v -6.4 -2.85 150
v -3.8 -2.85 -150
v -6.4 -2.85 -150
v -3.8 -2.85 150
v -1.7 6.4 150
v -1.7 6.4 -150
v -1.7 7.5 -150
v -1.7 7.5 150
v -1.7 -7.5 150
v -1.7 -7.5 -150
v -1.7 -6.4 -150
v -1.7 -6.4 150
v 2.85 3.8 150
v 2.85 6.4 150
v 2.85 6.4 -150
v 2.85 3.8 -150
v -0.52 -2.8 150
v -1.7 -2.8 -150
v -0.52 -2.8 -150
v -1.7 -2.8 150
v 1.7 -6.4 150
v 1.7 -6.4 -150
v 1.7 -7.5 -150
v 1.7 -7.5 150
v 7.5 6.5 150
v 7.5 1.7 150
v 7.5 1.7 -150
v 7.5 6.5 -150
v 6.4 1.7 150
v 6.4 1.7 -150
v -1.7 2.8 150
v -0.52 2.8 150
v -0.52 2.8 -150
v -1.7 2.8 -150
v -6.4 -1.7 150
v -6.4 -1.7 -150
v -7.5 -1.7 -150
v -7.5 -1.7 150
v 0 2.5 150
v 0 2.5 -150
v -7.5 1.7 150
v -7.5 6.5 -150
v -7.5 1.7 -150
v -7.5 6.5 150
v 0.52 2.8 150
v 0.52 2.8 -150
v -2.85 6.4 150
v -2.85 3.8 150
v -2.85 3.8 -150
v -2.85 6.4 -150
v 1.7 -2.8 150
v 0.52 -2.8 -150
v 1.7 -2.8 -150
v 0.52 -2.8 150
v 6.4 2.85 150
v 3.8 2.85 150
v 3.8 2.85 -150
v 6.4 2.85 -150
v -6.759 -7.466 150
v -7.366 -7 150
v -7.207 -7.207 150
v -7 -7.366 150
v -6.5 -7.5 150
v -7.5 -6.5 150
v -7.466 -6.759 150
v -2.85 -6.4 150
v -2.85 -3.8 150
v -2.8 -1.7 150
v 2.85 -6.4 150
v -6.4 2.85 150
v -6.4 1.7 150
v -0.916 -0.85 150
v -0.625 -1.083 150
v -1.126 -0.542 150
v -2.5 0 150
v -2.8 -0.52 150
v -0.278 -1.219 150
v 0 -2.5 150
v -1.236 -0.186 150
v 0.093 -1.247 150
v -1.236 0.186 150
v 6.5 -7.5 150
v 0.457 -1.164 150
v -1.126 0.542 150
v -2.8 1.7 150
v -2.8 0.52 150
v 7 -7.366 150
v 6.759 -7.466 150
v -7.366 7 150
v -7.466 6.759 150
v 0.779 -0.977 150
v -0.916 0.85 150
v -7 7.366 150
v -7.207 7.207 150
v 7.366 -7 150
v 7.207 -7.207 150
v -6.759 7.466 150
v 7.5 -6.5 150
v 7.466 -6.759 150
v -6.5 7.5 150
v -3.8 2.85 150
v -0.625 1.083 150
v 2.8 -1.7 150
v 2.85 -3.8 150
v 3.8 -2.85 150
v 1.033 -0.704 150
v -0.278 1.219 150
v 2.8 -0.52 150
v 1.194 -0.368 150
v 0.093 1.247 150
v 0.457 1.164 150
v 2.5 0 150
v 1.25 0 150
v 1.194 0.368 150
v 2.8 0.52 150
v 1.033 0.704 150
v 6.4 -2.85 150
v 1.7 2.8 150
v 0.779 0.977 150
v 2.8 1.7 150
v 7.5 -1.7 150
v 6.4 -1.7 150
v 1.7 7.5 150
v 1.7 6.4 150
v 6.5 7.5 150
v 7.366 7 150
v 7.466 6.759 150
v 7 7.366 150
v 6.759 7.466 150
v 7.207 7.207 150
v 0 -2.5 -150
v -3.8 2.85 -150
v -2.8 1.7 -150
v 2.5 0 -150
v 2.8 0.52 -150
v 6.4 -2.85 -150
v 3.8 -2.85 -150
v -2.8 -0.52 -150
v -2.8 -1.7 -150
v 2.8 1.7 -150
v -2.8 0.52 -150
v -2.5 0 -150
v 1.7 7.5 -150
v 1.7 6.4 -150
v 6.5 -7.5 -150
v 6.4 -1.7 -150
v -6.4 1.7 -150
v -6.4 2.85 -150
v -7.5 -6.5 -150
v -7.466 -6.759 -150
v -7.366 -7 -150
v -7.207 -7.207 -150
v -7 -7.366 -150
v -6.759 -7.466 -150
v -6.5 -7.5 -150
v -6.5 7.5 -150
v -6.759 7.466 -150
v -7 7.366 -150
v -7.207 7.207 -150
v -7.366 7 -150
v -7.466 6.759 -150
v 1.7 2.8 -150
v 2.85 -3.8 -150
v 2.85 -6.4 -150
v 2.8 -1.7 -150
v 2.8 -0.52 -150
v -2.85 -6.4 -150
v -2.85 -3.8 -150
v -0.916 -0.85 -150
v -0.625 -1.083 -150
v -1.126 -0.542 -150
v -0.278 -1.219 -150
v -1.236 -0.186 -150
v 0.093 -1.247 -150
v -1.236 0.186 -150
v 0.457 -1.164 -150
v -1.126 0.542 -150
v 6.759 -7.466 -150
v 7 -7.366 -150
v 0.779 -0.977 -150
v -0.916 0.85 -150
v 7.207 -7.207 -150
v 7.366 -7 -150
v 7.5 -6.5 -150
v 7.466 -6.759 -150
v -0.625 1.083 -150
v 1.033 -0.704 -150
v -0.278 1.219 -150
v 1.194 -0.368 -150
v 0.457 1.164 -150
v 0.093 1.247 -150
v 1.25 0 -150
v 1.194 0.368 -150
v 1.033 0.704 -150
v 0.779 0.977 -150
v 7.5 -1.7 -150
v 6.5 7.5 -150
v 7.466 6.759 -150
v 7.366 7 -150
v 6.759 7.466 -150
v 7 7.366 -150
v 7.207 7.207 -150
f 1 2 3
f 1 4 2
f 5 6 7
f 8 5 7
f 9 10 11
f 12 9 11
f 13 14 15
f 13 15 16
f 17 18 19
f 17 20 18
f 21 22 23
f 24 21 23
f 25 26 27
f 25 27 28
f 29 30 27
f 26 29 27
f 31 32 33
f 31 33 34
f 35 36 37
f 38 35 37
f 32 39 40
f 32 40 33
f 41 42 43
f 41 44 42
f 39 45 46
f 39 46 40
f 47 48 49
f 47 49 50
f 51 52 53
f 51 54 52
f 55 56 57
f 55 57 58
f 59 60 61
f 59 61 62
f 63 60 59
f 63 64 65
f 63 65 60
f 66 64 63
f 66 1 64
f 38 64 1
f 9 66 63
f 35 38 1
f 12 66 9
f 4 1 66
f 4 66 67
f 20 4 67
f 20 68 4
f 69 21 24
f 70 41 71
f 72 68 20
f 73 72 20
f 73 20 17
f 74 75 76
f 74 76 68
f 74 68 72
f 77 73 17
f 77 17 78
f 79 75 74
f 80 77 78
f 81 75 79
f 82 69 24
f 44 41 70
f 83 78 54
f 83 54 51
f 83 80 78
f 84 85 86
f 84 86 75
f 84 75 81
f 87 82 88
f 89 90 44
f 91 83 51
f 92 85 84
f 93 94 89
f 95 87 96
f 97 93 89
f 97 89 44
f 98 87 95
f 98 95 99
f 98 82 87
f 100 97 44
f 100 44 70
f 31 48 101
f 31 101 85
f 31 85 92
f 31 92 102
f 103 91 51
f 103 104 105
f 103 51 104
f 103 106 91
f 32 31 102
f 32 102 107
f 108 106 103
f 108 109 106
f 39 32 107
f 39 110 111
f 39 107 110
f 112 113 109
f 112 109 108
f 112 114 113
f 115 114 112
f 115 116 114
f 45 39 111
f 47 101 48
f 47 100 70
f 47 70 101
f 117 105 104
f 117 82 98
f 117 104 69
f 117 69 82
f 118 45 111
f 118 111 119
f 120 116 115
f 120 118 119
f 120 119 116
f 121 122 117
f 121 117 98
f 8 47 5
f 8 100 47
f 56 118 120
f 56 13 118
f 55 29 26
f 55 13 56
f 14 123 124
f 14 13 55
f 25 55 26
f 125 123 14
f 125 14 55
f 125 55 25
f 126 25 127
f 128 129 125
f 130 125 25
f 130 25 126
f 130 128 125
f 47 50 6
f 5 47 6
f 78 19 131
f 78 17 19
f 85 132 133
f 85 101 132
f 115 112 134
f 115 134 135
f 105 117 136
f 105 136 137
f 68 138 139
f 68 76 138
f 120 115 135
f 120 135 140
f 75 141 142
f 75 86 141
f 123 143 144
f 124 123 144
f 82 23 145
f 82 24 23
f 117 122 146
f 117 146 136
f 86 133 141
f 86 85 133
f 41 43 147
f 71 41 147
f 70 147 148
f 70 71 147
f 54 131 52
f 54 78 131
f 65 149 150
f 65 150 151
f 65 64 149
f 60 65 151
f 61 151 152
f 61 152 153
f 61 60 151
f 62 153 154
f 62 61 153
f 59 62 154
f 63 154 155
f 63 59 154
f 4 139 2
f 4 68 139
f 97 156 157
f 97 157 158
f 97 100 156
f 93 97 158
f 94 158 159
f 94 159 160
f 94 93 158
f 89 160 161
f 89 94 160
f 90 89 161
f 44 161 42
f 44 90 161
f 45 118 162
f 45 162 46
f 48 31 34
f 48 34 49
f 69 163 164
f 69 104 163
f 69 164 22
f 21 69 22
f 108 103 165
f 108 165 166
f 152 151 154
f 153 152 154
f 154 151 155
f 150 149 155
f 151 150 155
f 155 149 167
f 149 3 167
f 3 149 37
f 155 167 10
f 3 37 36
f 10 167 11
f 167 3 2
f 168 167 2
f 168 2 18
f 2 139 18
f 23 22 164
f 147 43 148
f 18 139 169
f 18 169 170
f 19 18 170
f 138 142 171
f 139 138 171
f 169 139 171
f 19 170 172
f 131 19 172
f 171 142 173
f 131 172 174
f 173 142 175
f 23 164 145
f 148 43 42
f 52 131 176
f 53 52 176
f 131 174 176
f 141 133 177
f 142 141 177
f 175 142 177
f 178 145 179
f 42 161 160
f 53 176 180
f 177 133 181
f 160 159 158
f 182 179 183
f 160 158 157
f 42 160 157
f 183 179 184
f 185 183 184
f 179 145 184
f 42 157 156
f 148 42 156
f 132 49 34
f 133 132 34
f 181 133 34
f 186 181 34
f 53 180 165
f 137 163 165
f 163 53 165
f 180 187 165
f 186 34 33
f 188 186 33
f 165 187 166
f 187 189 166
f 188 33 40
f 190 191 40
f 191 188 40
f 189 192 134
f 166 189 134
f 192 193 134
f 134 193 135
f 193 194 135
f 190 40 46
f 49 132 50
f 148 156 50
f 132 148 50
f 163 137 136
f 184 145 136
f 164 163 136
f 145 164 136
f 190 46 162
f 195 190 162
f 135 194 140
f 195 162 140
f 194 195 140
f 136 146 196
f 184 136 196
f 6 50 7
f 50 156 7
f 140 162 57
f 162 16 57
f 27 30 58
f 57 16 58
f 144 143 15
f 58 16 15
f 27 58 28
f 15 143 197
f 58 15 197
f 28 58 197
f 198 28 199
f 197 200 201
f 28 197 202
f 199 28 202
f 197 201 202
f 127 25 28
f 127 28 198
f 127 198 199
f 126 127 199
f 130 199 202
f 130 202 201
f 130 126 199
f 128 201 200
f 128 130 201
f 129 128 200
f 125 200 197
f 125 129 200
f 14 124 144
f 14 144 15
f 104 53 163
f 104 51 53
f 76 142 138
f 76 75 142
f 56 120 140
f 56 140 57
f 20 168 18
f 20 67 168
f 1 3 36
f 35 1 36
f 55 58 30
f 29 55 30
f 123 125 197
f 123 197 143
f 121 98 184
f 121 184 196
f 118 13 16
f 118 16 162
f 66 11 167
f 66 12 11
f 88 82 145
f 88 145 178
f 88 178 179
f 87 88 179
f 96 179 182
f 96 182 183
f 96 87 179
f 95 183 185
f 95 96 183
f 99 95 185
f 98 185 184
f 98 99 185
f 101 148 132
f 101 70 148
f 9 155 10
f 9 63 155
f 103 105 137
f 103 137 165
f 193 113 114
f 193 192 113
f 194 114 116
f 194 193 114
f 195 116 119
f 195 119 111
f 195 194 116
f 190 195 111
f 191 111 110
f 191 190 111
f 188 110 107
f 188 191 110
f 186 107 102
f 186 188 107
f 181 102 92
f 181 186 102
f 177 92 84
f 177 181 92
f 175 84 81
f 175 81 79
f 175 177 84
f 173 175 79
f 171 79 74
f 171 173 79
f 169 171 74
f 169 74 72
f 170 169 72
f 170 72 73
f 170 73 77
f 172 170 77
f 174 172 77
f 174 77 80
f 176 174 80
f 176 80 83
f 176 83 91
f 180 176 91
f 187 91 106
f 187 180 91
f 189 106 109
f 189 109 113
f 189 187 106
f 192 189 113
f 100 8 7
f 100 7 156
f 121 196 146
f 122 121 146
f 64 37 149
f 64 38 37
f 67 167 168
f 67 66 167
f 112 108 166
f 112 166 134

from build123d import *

# Parameters (mm, degrees)
F0_R     = 1.25
F1_DEPTH = 150


with BuildPart() as f1:
    # F0 (on Top) → F1 (new body, symmetric)
    with BuildSketch(Plane.XY):
        with BuildLine():
            Line((1.7, -7.5), (6.5, -7.5))
            ThreePointArc((6.5, -7.5), (7.207107, -7.207107), (7.5, -6.5))
            Line((7.5, -6.5), (7.5, -1.7))
            Line((7.5, -1.7), (6.4, -1.7))
            Line((6.4, -1.7), (6.4, -2.85))
            Line((6.4, -2.85), (3.8, -2.85))
            Line((3.8, -2.85), (2.8, -1.7))
            Line((2.8, -1.7), (2.8, -0.519615))
            Line((2.8, -0.519615), (2.5, 0))
            Line((2.5, 0), (2.8, 0.519615))
            Line((2.8, 0.519615), (2.8, 1.7))
            Line((2.8, 1.7), (3.8, 2.85))
            Line((3.8, 2.85), (6.4, 2.85))
            Line((6.4, 2.85), (6.4, 1.7))
            Line((6.4, 1.7), (7.5, 1.7))
            Line((7.5, 1.7), (7.5, 6.5))
            ThreePointArc((7.5, 6.5), (7.207107, 7.207107), (6.5, 7.5))
            Line((6.5, 7.5), (1.7, 7.5))
            Line((1.7, 7.5), (1.7, 6.4))
            Line((1.7, 6.4), (2.85, 6.4))
            Line((2.85, 6.4), (2.85, 3.8))
            Line((2.85, 3.8), (1.7, 2.8))
            Line((1.7, 2.8), (0.519615, 2.8))
            Line((0.519615, 2.8), (0, 2.5))
            Line((0, 2.5), (-0.519615, 2.8))
            Line((-0.519615, 2.8), (-1.7, 2.8))
            Line((-1.7, 2.8), (-2.85, 3.8))
            Line((-2.85, 3.8), (-2.85, 6.4))
            Line((-2.85, 6.4), (-1.7, 6.4))
            Line((-1.7, 6.4), (-1.7, 7.5))
            Line((-1.7, 7.5), (-6.5, 7.5))
            ThreePointArc((-6.5, 7.5), (-7.207107, 7.207107), (-7.5, 6.5))
            Line((-7.5, 6.5), (-7.5, 1.7))
            Line((-7.5, 1.7), (-6.4, 1.7))
            Line((-6.4, 1.7), (-6.4, 2.85))
            Line((-6.4, 2.85), (-3.8, 2.85))
            Line((-3.8, 2.85), (-2.8, 1.7))
            Line((-2.8, 1.7), (-2.8, 0.519615))
            Line((-2.8, 0.519615), (-2.5, 0))
            Line((-2.5, 0), (-2.8, -0.519615))
            Line((-2.8, -0.519615), (-2.8, -1.7))
            Line((-2.8, -1.7), (-3.8, -2.85))
            Line((-3.8, -2.85), (-6.4, -2.85))
            Line((-6.4, -2.85), (-6.4, -1.7))
            Line((-6.4, -1.7), (-7.5, -1.7))
            Line((-7.5, -1.7), (-7.5, -6.5))
            ThreePointArc((-7.5, -6.5), (-7.207107, -7.207107), (-6.5, -7.5))
            Line((-6.5, -7.5), (-1.7, -7.5))
            Line((-1.7, -7.5), (-1.7, -6.4))
            Line((-1.7, -6.4), (-2.85, -6.4))
            Line((-2.85, -6.4), (-2.85, -3.8))
            Line((-2.85, -3.8), (-1.7, -2.8))
            Line((-1.7, -2.8), (-0.519615, -2.8))
            Line((-0.519615, -2.8), (0, -2.5))
            Line((0, -2.5), (0.519615, -2.8))
            Line((0.519615, -2.8), (1.7, -2.8))
            Line((1.7, -2.8), (2.85, -3.8))
            Line((2.85, -3.8), (2.85, -6.4))
            Line((2.85, -6.4), (1.7, -6.4))
            Line((1.7, -6.4), (1.7, -7.5))
        make_face()
        Circle(F0_R, mode=Mode.SUBTRACT)
    extrude(amount=F1_DEPTH, both=True)


solid = f1.part
